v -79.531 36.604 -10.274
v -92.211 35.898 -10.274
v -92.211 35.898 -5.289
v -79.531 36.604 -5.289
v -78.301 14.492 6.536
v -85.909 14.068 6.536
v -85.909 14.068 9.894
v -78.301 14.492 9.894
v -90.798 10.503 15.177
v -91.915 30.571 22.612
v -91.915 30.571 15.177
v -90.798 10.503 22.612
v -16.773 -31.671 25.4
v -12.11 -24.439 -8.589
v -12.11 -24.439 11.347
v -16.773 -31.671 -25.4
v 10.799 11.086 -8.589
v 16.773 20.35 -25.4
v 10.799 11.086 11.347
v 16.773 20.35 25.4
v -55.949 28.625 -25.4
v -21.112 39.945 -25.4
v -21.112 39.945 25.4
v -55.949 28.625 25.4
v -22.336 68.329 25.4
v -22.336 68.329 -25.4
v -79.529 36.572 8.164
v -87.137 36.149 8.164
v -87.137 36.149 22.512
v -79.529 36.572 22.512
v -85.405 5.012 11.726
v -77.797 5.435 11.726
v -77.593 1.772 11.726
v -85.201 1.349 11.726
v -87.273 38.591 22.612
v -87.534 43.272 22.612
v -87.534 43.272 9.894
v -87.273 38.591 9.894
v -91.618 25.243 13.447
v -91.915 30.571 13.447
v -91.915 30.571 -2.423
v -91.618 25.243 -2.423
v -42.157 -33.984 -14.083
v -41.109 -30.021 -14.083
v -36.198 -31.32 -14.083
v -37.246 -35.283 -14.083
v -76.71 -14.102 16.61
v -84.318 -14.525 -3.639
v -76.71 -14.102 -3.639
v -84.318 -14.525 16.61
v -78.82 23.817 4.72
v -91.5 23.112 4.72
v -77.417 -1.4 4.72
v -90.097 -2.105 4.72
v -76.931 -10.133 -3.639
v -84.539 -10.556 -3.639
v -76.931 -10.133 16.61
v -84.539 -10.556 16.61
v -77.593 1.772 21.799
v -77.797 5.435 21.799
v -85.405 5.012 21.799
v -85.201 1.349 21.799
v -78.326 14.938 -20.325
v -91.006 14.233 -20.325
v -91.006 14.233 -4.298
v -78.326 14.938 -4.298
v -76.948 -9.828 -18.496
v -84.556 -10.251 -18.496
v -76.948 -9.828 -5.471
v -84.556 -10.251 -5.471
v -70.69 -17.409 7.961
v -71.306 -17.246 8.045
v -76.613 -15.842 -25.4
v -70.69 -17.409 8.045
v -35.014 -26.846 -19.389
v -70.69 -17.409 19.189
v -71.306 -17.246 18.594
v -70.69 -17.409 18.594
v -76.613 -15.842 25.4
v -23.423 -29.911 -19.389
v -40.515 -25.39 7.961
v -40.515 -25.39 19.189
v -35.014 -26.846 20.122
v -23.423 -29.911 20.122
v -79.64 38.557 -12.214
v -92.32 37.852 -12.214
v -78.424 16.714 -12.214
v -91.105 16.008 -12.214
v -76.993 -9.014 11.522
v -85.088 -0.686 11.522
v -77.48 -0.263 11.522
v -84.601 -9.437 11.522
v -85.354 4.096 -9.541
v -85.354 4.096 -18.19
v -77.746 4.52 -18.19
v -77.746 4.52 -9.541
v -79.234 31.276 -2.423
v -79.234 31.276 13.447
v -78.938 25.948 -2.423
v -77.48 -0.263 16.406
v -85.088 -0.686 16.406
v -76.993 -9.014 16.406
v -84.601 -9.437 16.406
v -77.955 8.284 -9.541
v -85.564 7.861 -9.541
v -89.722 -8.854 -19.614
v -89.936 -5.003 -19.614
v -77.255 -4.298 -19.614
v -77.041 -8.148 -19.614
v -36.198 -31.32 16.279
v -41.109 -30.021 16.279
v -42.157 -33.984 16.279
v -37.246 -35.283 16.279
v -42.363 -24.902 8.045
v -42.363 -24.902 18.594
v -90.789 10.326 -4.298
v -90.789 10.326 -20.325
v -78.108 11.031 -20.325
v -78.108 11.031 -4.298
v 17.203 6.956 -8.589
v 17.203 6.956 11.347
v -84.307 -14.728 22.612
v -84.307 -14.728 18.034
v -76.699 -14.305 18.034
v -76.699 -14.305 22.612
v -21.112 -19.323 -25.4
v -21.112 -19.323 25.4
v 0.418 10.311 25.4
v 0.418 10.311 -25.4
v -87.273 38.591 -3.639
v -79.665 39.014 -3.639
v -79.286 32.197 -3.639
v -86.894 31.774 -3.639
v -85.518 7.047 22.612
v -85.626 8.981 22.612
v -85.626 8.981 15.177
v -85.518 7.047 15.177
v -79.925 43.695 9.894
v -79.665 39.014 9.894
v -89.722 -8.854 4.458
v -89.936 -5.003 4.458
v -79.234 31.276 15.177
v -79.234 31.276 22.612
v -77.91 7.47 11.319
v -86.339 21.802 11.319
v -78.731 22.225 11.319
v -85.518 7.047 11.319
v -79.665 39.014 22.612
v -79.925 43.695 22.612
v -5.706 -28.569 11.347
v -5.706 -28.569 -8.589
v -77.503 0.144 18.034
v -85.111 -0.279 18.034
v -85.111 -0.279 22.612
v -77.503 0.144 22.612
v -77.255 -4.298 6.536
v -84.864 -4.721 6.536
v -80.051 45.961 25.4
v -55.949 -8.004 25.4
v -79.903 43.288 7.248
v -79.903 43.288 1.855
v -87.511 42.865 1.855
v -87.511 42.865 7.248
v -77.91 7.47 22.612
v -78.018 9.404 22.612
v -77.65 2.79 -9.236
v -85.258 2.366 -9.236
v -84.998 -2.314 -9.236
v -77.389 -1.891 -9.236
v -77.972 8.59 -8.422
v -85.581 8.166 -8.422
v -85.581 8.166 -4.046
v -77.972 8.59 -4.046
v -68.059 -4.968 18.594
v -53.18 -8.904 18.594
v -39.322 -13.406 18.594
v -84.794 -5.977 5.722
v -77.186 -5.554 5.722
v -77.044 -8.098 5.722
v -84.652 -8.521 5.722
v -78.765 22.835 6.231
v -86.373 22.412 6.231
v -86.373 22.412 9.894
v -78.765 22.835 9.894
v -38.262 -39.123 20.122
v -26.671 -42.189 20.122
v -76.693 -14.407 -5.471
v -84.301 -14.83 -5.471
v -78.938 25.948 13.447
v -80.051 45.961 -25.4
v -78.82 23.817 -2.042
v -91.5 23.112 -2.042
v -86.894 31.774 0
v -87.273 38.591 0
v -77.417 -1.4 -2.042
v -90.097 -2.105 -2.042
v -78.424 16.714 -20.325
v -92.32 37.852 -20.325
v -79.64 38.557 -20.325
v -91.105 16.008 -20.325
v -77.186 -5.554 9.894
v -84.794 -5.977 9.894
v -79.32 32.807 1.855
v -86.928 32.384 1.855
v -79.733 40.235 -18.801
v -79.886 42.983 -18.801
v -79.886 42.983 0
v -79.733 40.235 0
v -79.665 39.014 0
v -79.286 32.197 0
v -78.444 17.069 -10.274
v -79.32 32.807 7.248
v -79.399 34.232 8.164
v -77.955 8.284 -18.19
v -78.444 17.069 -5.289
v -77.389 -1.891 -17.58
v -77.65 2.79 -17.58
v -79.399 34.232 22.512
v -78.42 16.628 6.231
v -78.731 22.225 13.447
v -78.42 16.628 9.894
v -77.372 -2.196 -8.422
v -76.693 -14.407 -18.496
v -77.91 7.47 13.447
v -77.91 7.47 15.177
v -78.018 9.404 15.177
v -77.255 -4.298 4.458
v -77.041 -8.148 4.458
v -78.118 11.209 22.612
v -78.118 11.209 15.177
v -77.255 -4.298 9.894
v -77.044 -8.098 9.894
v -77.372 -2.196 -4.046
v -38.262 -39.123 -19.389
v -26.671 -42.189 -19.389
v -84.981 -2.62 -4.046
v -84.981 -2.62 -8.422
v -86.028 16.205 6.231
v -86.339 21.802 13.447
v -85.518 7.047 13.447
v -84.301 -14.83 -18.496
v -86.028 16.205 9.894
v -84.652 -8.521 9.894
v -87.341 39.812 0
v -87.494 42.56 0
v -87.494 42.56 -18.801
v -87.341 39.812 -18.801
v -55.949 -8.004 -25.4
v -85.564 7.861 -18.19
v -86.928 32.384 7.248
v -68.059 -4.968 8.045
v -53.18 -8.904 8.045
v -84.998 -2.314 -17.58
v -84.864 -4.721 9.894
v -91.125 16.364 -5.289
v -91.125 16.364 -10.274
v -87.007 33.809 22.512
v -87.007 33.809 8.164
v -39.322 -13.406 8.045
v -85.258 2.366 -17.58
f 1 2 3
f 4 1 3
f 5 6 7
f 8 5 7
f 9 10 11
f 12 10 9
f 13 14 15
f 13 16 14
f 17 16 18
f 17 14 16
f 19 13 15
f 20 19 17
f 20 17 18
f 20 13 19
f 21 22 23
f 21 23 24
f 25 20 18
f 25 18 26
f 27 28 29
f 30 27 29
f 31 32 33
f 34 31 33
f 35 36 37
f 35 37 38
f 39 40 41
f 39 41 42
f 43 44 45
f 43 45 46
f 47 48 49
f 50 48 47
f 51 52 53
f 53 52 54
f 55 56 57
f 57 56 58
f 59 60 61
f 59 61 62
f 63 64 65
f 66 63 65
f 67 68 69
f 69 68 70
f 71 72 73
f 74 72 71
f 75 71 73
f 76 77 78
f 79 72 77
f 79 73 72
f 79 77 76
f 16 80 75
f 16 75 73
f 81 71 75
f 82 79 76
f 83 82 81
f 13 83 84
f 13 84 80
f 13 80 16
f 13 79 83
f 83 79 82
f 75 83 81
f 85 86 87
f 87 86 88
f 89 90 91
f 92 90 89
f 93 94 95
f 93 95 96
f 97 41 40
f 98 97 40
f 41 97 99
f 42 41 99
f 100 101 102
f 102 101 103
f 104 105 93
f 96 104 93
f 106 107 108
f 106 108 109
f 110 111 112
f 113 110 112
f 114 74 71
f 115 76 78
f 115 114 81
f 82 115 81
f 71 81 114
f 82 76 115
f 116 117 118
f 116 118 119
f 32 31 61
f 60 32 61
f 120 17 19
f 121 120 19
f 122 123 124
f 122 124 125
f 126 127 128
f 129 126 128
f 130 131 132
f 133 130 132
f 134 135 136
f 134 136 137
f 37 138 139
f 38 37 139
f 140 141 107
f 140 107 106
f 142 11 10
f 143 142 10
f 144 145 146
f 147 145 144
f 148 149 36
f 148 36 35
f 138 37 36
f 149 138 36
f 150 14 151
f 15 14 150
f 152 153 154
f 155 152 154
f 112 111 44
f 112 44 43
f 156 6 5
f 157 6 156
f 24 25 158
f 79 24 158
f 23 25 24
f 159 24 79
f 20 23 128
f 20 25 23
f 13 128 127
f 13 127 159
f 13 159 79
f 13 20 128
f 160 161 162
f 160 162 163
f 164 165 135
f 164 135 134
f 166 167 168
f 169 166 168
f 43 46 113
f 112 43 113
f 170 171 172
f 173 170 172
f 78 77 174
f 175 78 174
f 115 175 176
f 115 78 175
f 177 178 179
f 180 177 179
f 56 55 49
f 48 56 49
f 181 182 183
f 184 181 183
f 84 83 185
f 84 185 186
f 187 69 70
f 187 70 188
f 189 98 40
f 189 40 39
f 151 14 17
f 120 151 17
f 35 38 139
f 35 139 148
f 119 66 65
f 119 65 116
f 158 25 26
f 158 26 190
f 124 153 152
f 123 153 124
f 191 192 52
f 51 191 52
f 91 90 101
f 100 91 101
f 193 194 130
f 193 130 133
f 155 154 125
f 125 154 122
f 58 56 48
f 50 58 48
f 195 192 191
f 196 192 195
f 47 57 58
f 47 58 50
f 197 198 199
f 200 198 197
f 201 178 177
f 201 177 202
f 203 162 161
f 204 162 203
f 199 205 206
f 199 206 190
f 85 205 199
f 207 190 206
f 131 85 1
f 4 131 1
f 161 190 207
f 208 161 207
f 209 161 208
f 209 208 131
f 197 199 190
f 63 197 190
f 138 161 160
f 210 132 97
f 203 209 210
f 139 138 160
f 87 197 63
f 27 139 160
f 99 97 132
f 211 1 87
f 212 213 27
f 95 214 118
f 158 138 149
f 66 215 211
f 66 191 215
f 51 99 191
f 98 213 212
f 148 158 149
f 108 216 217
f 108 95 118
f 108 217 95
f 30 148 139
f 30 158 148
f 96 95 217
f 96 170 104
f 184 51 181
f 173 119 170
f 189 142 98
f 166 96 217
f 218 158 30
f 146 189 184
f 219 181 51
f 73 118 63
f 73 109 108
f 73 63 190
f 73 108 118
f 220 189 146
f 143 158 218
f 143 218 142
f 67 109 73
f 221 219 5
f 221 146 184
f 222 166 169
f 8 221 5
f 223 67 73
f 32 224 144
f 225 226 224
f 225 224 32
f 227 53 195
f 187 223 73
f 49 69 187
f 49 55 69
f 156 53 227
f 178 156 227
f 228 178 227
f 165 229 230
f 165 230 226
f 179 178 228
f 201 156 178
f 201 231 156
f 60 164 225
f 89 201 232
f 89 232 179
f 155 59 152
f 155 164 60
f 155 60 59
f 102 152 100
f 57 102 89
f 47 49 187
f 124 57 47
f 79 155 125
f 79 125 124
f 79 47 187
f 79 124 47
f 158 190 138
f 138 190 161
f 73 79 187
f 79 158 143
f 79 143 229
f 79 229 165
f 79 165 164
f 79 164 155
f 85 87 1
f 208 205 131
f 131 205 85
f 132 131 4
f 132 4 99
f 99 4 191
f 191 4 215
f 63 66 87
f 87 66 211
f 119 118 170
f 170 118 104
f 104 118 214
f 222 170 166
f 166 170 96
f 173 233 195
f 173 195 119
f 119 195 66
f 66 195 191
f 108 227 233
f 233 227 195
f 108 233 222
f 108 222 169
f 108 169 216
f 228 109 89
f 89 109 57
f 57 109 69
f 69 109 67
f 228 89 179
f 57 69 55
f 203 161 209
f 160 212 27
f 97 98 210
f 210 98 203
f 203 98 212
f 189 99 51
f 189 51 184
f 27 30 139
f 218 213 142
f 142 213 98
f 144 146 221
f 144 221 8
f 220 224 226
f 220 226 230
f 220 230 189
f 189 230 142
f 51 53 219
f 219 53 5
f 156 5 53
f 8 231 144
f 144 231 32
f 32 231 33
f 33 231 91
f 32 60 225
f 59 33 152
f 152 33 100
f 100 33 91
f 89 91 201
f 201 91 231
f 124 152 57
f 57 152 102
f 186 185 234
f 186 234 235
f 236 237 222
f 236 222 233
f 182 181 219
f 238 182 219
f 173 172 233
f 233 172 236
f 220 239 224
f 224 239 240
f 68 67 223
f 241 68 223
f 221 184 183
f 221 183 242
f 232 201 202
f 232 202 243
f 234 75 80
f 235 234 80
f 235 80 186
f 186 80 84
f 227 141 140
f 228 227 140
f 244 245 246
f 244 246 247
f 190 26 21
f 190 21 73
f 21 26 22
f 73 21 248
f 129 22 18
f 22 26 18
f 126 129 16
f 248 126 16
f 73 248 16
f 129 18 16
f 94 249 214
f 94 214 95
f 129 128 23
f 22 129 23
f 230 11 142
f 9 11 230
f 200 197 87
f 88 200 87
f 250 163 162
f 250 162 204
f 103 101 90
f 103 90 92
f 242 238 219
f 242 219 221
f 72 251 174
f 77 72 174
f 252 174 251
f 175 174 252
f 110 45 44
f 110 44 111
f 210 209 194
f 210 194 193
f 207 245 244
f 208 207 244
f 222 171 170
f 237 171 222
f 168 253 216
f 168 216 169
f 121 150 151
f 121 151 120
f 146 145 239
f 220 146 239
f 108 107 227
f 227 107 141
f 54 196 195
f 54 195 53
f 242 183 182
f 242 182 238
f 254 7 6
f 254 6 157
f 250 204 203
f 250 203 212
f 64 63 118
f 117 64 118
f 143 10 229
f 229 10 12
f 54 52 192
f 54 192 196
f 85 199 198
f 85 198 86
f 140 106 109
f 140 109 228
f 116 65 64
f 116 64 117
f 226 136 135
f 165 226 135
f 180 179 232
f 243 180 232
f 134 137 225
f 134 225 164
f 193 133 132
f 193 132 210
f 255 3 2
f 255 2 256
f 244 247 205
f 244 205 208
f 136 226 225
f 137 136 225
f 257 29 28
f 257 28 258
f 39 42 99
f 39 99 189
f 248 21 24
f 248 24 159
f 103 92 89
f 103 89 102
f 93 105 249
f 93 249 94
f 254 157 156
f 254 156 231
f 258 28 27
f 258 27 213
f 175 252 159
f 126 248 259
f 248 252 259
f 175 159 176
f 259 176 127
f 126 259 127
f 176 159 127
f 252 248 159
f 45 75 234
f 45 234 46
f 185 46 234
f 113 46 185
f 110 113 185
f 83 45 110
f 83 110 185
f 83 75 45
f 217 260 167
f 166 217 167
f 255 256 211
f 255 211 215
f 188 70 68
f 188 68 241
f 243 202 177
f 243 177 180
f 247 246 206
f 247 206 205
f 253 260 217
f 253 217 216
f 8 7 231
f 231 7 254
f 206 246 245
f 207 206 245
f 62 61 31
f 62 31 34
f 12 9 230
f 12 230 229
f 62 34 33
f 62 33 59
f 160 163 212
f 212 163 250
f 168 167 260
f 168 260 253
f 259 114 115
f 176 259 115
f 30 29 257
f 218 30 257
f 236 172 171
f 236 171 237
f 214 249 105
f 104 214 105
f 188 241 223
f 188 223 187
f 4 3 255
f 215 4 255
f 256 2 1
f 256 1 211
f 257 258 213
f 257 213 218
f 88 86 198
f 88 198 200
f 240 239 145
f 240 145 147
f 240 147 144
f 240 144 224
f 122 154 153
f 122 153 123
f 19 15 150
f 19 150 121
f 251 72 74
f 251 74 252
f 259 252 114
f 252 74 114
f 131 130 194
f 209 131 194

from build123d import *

# Parameters (mm, degrees)
F1_DEPTH  = 25.4
F2_DEPTH  = 25.4
F3_W      = 42.2709332779
F3_H      = 19.9366761371
F4_DEPTH  = 7.62
F5_W      = 11.9896456599
F5_H      = 39.5106691867
F6_DEPTH  = 12.7
F7_W      = 31.212631613
F7_H      = 11.2281162292
F8_DEPTH  = 7.62
F9_W      = 29.9386493862
F9_H      = 10.5491885915
F10_DEPTH = 12.7
F11_W     = 4.0996596217
F11_H     = 30.3628398106
F12_DEPTH = 5.08
F13_W     = 20.0984636322
F13_H     = 7.4342815205
F13_W_2   = 5.3358711302
F13_H_2   = 15.8698209561
F13_W_3   = 25.2564756665
F13_H_3   = 6.7615092266
F13_W_4   = 3.9129797369
F13_H_4   = 16.0269849002
F13_W_5   = 19.5648819208
F13_H_5   = 4.9852463417
F13_W_6   = 21.8770895153
F13_H_6   = 8.1112636253
F13_W_7   = 3.8565089926
F13_H_7   = 24.0716314875
F14_DEPTH = 12.7
F15_W     = 2.3439750075
F15_H     = 14.3474126235
F15_W_2   = 10.4969404638
F15_H_2   = 5.3929993883
F15_W_3   = 4.6879537404
F15_H_3   = 12.7176120877
F15_W_4   = 2.7516260743
F15_H_4   = 18.800791353
F15_W_5   = 6.8281069398
F15_H_5   = 3.639341332
F15_W_6   = 10.8026759699
F15_H_6   = 4.3754521757
F15_W_7   = 4.6879523434
F15_H_7   = 8.343886584
F15_W_8   = 3.7707453594
F15_H_8   = 8.649148047
F15_W_9   = 6.2166322023
F15_H_9   = 3.6631692201
F15_W_10  = 14.7772468626
F15_H_10  = 2.1284492686
F15_W_11  = 18.8184157014
F15_H_11  = 3.3579049632
F15_W_12  = 3.6688325927
F15_H_12  = 10.0737148896
F15_W_13  = 1.9363295287
F15_H_13  = 7.4342815205
F15_W_14  = 14.4715099595
F15_H_14  = 4.57723625
F15_W_15  = 8.7644355372
F15_H_15  = 4.8842262477
F15_W_16  = 3.9745708928
F15_H_16  = 20.249187015
F15_W_17  = 2.5478007738
F15_H_17  = 4.1719428264
F15_W_18  = 4.586043302
F15_H_18  = 13.0246016197
F16_DEPTH = 7.62
F17_W     = 61.8985138723
F17_H     = 50.8
F17_W_2   = 21.8770895153
F17_H_2   = 8.1112636253
F17_W_3   = 2.7516260743
F17_H_3   = 18.800791353
F17_W_4   = 6.8281069398
F17_H_4   = 3.639341332
F17_W_5   = 19.5648819208
F17_H_5   = 4.9852463417
F17_W_6   = 3.7707453594
F17_H_6   = 8.649148047
F17_W_7   = 4.6879523434
F17_H_7   = 8.343886584
F17_W_8   = 3.9129797369
F17_H_8   = 16.0269849002
F17_W_9   = 10.8026759699
F17_H_9   = 4.3754521757
F17_W_10  = 3.8565089926
F17_H_10  = 24.0716314875
F17_W_11  = 4.586043302
F17_H_11  = 13.0246016197
F17_W_12  = 10.4969404638
F17_H_12  = 5.3929993883
F17_W_13  = 5.3358711302
F17_H_13  = 15.8698209561
F17_W_14  = 6.2166322023
F17_H_14  = 3.6631692201
F17_W_15  = 4.6879537404
F17_H_15  = 12.7176120877
F17_W_16  = 2.3439750075
F17_H_16  = 14.3474126235
F17_W_17  = 20.0984636322
F17_H_17  = 7.4342815205
F17_W_18  = 25.2564756665
F17_H_18  = 6.7615092266
F17_W_19  = 14.7772468626
F17_H_19  = 2.1284492686
F17_W_20  = 18.8184157014
F17_H_20  = 3.3579049632
F17_W_21  = 2.5478007738
F17_H_21  = 4.1719428264
F17_W_22  = 3.9745708928
F17_H_22  = 20.249187015
F17_W_23  = 1.9363295287
F17_W_24  = 3.6688325927
F17_H_23  = 10.0737148896
F17_W_25  = 8.7644355372
F17_H_24  = 4.8842262477
F17_W_26  = 14.4715099595
F17_H_25  = 4.57723625
F18_DEPTH = 5.08
F20_DEPTH = 76.2
F21_DEPTH = 5.08


with BuildPart() as f1:
    # F0 (on Top) → F1 (new body)
    with BuildSketch(Plane.XY):
        Polygon((-16.7726497146, -31.6705114622), (16.7726497146, 20.3500508744), (-22.335777472, 68.3287643065), (-80.051414149, 45.9606776074), (-76.6132121111, -15.842273668), align=None)
    extrude(amount=F1_DEPTH)

    # F2 (add): a face of the model
    f2_faces = [f1.faces().sort_by_distance(p)[0] for p in [
        (-35.8000807464, 17.4253415316, 0),
    ]]
    extrude(f2_faces, amount=F2_DEPTH)

    # F3 (on face) → F4 (join)
    with BuildSketch(Plane(origin=(2.5779849193, -1.6624056365, 0), x_dir=(0.5419403041, 0.8404169839, 0), z_dir=(0.8404169839, -0.5419403041, 0))):
        with Locations((-5.966336932, 1.3790032826)):
            Rectangle(F3_W, F3_H)
    extrude(amount=F4_DEPTH)

    # F5 (on face) → F6 (join)
    with BuildSketch(Plane(origin=(-8.9260455296, -33.7459919046, 0), x_dir=(0.9667528128, -0.2557127272, 0), z_dir=(-0.2557127272, -0.9667528128, 0))):
        with Locations((-20.9904853255, 0.3661895171)):
            Rectangle(F5_W, F5_H)
    extrude(amount=F6_DEPTH)

    # F7 (on face) → F8 (join)
    with BuildSketch(Plane(origin=(-8.9260455296, -33.7459919046, 0), x_dir=(0.9667528128, -0.2557127272, 0), z_dir=(-0.2557127272, -0.9667528128, 0))):
        with Locations((-48.2821147889, 13.5751133785)):
            Rectangle(F7_W, F7_H)
    extrude(amount=-F8_DEPTH)

    # F9 (on face) → F10 (cut)
    with BuildSketch(Plane(origin=(-8.9260455296, -33.7459919046, 0), x_dir=(0.9667528128, -0.2557127272, 0), z_dir=(-0.2557127272, -0.9667528128, 0))):
        with Locations((-49.556100741, 13.31924228)):
            Rectangle(F9_W, F9_H)
    extrude(amount=-F10_DEPTH, mode=Mode.SUBTRACT)

    # F11 (on face) → F12 (join)
    with BuildSketch(Plane(origin=(-26.0881225645, 6.9004867437, 0), x_dir=(-0.2557127272, -0.9667528128, 0), z_dir=(-0.9667528128, 0.2557127272, 0))):
        with Locations((41.5847562253, 1.0980186053)):
            Rectangle(F11_W, F11_H)
    extrude(amount=F12_DEPTH)

    # F13 (on face) → F14 (join)
    with BuildSketch(Plane(origin=(-77.2554477784, -4.2978503859, 0), x_dir=(0.055545793, -0.9984561407, 0), z_dir=(-0.9984561407, -0.055545793, 0))):
        with Locations((-25.5797388963, 18.8945052214)):
            Rectangle(F13_W, F13_H)
        with Locations((-32.961031422, 5.5121385958)):
            Rectangle(F13_W_2, F13_H_2)
        with Locations((-15.5305069638, 1.3388268417)):
            Rectangle(F13_W_3, F13_H_3)
        with Locations((-17.3091338947, -12.3113878071)):
            Rectangle(F13_W_4, F13_H_4)
        with Locations((-31.1824083328, -7.7815449331)):
            Rectangle(F13_W_5, F13_H_5)
        with Locations((-31.9827897474, -16.2692484446)):
            Rectangle(F13_W_6, F13_H_6)
        with Locations((1.9282544963, -7.5779159088)):
            Rectangle(F13_W_7, F13_H_7)
    extrude(amount=F14_DEPTH)

    # F15 (on face) → F16 (join)
    with BuildSketch(Plane(origin=(-77.2554477784, -4.2978503859, 0), x_dir=(0.055545793, -0.9984561407, 0), z_dir=(-0.9984561407, -0.055545793, 0))):
        with Locations((-39.761338383, 15.3379100375)):
            Rectangle(F15_W, F15_H)
        with Locations((-42.4110535532, 4.5519121923)):
            Rectangle(F15_W_2, F15_H_2)
        with Locations((-45.7231942564, 16.2528399378)):
            Rectangle(F15_W_3, F15_H_3)
        with Locations((-45.9779724479, -9.4003956765)):
            Rectangle(F15_W_4, F15_H_4)
        with Locations((-39.9651639163, -1.819670666)):
            Rectangle(F15_W_5, F15_H_5)
        with Locations((-7.5061791576, -6.2340861186)):
            Rectangle(F15_W_6, F15_H_6)
        with Locations((-4.7545537818, -13.407792896)):
            Rectangle(F15_W_7, F15_H_7)
        with Locations((-10.7164080255, -13.8656888157)):
            Rectangle(F15_W_8, F15_H_8)
        with Locations((-24.066885002, 8.0624492839)):
            Rectangle(F15_W_9, F15_H_9)
        with Locations((-19.1751066595, 12.3828244396)):
            Rectangle(F15_W_10, F15_H_10)
        with Locations((-9.4092078507, 8.2150814123)):
            Rectangle(F15_W_11, F15_H_11)
        with Locations((-7.9138264991, 16.7624759488)):
            Rectangle(F15_W_12, F15_H_12)
        with Locations((-12.7546479926, 18.8945052214)):
            Rectangle(F15_W_13, F15_H_13)
        with Locations((2.7869374026, 20.3230278566)):
            Rectangle(F15_W_14, F15_H_14)
        with Locations((0.3410479985, 13.9642218128)):
            Rectangle(F15_W_15, F15_H_15)
        with Locations((7.8315832652, 6.4852521755)):
            Rectangle(F15_W_16, F15_H_16)
        with Locations((2.5321574649, 7.8080624808)):
            Rectangle(F15_W_17, F15_H_17)
        with Locations((7.831583498, -11.9832272176)):
            Rectangle(F15_W_18, F15_H_18)
    extrude(amount=F16_DEPTH)

    # F17 (on face) → F18 (cut)
    with BuildSketch(Plane(origin=(-77.2554477784, -4.2978503859, 0), x_dir=(0.055545793, -0.9984561407, 0), z_dir=(-0.9984561407, -0.055545793, 0))):
        with Locations((-19.38698313, 0)):
            Rectangle(F17_W, F17_H)
        with Locations((-31.9827897474, -16.2692484446)):
            Rectangle(F17_W_2, F17_H_2, mode=Mode.SUBTRACT)
        with Locations((-45.9779724479, -9.4003956765)):
            Rectangle(F17_W_3, F17_H_3, mode=Mode.SUBTRACT)
        with Locations((-39.9651639163, -1.819670666)):
            Rectangle(F17_W_4, F17_H_4, mode=Mode.SUBTRACT)
        with Locations((-31.1824083328, -7.7815449331)):
            Rectangle(F17_W_5, F17_H_5, mode=Mode.SUBTRACT)
        with Locations((-10.7164080255, -13.8656888157)):
            Rectangle(F17_W_6, F17_H_6, mode=Mode.SUBTRACT)
        with Locations((-4.7545537818, -13.407792896)):
            Rectangle(F17_W_7, F17_H_7, mode=Mode.SUBTRACT)
        with Locations((-17.3091338947, -12.3113878071)):
            Rectangle(F17_W_8, F17_H_8, mode=Mode.SUBTRACT)
        with Locations((-7.5061791576, -6.2340861186)):
            Rectangle(F17_W_9, F17_H_9, mode=Mode.SUBTRACT)
        with Locations((1.9282544963, -7.5779159088)):
            Rectangle(F17_W_10, F17_H_10, mode=Mode.SUBTRACT)
        with Locations((7.831583498, -11.9832272176)):
            Rectangle(F17_W_11, F17_H_11, mode=Mode.SUBTRACT)
        with Locations((-42.4110535532, 4.5519121923)):
            Rectangle(F17_W_12, F17_H_12, mode=Mode.SUBTRACT)
        with Locations((-32.961031422, 5.5121385958)):
            Rectangle(F17_W_13, F17_H_13, mode=Mode.SUBTRACT)
        with Locations((-24.066885002, 8.0624492839)):
            Rectangle(F17_W_14, F17_H_14, mode=Mode.SUBTRACT)
        with Locations((-45.7231942564, 16.2528399378)):
            Rectangle(F17_W_15, F17_H_15, mode=Mode.SUBTRACT)
        with Locations((-39.761338383, 15.3379100375)):
            Rectangle(F17_W_16, F17_H_16, mode=Mode.SUBTRACT)
        with Locations((-25.5797388963, 18.8945052214)):
            Rectangle(F17_W_17, F17_H_17, mode=Mode.SUBTRACT)
        with Locations((-15.5305069638, 1.3388268417)):
            Rectangle(F17_W_18, F17_H_18, mode=Mode.SUBTRACT)
        with Locations((-19.1751066595, 12.3828244396)):
            Rectangle(F17_W_19, F17_H_19, mode=Mode.SUBTRACT)
        with Locations((-9.4092078507, 8.2150814123)):
            Rectangle(F17_W_20, F17_H_20, mode=Mode.SUBTRACT)
        with Locations((2.5321574649, 7.8080624808)):
            Rectangle(F17_W_21, F17_H_21, mode=Mode.SUBTRACT)
        with Locations((7.8315832652, 6.4852521755)):
            Rectangle(F17_W_22, F17_H_22, mode=Mode.SUBTRACT)
        with Locations((-12.7546479926, 18.8945052214)):
            Rectangle(F17_W_23, F17_H_17, mode=Mode.SUBTRACT)
        with Locations((-7.9138264991, 16.7624759488)):
            Rectangle(F17_W_24, F17_H_23, mode=Mode.SUBTRACT)
        with Locations((0.3410479985, 13.9642218128)):
            Rectangle(F17_W_25, F17_H_24, mode=Mode.SUBTRACT)
        with Locations((2.7869374026, 20.3230278566)):
            Rectangle(F17_W_26, F17_H_25, mode=Mode.SUBTRACT)
    extrude(amount=-F18_DEPTH, mode=Mode.SUBTRACT)

    # F19 (on face) → F20 (cut)
    with BuildSketch(Plane.XY.offset(25.4)):
        Polygon((-55.9489503503, 28.6254710477), (-55.9489503503, -8.0040893477), (-21.1121682472, -19.3232460063), (0.4181471511, 10.31069085), (-21.1121682472, 39.9446277064), align=None)
    extrude(amount=-F20_DEPTH, mode=Mode.SUBTRACT)

    # F21 (add): a face of the model
    f21_faces = [f1.faces().sort_by_distance(p)[0] for p in [
        (-71.5855334196, -14.7605835197, 0),
    ]]
    extrude(f21_faces, amount=F21_DEPTH)


solid = f1.part
